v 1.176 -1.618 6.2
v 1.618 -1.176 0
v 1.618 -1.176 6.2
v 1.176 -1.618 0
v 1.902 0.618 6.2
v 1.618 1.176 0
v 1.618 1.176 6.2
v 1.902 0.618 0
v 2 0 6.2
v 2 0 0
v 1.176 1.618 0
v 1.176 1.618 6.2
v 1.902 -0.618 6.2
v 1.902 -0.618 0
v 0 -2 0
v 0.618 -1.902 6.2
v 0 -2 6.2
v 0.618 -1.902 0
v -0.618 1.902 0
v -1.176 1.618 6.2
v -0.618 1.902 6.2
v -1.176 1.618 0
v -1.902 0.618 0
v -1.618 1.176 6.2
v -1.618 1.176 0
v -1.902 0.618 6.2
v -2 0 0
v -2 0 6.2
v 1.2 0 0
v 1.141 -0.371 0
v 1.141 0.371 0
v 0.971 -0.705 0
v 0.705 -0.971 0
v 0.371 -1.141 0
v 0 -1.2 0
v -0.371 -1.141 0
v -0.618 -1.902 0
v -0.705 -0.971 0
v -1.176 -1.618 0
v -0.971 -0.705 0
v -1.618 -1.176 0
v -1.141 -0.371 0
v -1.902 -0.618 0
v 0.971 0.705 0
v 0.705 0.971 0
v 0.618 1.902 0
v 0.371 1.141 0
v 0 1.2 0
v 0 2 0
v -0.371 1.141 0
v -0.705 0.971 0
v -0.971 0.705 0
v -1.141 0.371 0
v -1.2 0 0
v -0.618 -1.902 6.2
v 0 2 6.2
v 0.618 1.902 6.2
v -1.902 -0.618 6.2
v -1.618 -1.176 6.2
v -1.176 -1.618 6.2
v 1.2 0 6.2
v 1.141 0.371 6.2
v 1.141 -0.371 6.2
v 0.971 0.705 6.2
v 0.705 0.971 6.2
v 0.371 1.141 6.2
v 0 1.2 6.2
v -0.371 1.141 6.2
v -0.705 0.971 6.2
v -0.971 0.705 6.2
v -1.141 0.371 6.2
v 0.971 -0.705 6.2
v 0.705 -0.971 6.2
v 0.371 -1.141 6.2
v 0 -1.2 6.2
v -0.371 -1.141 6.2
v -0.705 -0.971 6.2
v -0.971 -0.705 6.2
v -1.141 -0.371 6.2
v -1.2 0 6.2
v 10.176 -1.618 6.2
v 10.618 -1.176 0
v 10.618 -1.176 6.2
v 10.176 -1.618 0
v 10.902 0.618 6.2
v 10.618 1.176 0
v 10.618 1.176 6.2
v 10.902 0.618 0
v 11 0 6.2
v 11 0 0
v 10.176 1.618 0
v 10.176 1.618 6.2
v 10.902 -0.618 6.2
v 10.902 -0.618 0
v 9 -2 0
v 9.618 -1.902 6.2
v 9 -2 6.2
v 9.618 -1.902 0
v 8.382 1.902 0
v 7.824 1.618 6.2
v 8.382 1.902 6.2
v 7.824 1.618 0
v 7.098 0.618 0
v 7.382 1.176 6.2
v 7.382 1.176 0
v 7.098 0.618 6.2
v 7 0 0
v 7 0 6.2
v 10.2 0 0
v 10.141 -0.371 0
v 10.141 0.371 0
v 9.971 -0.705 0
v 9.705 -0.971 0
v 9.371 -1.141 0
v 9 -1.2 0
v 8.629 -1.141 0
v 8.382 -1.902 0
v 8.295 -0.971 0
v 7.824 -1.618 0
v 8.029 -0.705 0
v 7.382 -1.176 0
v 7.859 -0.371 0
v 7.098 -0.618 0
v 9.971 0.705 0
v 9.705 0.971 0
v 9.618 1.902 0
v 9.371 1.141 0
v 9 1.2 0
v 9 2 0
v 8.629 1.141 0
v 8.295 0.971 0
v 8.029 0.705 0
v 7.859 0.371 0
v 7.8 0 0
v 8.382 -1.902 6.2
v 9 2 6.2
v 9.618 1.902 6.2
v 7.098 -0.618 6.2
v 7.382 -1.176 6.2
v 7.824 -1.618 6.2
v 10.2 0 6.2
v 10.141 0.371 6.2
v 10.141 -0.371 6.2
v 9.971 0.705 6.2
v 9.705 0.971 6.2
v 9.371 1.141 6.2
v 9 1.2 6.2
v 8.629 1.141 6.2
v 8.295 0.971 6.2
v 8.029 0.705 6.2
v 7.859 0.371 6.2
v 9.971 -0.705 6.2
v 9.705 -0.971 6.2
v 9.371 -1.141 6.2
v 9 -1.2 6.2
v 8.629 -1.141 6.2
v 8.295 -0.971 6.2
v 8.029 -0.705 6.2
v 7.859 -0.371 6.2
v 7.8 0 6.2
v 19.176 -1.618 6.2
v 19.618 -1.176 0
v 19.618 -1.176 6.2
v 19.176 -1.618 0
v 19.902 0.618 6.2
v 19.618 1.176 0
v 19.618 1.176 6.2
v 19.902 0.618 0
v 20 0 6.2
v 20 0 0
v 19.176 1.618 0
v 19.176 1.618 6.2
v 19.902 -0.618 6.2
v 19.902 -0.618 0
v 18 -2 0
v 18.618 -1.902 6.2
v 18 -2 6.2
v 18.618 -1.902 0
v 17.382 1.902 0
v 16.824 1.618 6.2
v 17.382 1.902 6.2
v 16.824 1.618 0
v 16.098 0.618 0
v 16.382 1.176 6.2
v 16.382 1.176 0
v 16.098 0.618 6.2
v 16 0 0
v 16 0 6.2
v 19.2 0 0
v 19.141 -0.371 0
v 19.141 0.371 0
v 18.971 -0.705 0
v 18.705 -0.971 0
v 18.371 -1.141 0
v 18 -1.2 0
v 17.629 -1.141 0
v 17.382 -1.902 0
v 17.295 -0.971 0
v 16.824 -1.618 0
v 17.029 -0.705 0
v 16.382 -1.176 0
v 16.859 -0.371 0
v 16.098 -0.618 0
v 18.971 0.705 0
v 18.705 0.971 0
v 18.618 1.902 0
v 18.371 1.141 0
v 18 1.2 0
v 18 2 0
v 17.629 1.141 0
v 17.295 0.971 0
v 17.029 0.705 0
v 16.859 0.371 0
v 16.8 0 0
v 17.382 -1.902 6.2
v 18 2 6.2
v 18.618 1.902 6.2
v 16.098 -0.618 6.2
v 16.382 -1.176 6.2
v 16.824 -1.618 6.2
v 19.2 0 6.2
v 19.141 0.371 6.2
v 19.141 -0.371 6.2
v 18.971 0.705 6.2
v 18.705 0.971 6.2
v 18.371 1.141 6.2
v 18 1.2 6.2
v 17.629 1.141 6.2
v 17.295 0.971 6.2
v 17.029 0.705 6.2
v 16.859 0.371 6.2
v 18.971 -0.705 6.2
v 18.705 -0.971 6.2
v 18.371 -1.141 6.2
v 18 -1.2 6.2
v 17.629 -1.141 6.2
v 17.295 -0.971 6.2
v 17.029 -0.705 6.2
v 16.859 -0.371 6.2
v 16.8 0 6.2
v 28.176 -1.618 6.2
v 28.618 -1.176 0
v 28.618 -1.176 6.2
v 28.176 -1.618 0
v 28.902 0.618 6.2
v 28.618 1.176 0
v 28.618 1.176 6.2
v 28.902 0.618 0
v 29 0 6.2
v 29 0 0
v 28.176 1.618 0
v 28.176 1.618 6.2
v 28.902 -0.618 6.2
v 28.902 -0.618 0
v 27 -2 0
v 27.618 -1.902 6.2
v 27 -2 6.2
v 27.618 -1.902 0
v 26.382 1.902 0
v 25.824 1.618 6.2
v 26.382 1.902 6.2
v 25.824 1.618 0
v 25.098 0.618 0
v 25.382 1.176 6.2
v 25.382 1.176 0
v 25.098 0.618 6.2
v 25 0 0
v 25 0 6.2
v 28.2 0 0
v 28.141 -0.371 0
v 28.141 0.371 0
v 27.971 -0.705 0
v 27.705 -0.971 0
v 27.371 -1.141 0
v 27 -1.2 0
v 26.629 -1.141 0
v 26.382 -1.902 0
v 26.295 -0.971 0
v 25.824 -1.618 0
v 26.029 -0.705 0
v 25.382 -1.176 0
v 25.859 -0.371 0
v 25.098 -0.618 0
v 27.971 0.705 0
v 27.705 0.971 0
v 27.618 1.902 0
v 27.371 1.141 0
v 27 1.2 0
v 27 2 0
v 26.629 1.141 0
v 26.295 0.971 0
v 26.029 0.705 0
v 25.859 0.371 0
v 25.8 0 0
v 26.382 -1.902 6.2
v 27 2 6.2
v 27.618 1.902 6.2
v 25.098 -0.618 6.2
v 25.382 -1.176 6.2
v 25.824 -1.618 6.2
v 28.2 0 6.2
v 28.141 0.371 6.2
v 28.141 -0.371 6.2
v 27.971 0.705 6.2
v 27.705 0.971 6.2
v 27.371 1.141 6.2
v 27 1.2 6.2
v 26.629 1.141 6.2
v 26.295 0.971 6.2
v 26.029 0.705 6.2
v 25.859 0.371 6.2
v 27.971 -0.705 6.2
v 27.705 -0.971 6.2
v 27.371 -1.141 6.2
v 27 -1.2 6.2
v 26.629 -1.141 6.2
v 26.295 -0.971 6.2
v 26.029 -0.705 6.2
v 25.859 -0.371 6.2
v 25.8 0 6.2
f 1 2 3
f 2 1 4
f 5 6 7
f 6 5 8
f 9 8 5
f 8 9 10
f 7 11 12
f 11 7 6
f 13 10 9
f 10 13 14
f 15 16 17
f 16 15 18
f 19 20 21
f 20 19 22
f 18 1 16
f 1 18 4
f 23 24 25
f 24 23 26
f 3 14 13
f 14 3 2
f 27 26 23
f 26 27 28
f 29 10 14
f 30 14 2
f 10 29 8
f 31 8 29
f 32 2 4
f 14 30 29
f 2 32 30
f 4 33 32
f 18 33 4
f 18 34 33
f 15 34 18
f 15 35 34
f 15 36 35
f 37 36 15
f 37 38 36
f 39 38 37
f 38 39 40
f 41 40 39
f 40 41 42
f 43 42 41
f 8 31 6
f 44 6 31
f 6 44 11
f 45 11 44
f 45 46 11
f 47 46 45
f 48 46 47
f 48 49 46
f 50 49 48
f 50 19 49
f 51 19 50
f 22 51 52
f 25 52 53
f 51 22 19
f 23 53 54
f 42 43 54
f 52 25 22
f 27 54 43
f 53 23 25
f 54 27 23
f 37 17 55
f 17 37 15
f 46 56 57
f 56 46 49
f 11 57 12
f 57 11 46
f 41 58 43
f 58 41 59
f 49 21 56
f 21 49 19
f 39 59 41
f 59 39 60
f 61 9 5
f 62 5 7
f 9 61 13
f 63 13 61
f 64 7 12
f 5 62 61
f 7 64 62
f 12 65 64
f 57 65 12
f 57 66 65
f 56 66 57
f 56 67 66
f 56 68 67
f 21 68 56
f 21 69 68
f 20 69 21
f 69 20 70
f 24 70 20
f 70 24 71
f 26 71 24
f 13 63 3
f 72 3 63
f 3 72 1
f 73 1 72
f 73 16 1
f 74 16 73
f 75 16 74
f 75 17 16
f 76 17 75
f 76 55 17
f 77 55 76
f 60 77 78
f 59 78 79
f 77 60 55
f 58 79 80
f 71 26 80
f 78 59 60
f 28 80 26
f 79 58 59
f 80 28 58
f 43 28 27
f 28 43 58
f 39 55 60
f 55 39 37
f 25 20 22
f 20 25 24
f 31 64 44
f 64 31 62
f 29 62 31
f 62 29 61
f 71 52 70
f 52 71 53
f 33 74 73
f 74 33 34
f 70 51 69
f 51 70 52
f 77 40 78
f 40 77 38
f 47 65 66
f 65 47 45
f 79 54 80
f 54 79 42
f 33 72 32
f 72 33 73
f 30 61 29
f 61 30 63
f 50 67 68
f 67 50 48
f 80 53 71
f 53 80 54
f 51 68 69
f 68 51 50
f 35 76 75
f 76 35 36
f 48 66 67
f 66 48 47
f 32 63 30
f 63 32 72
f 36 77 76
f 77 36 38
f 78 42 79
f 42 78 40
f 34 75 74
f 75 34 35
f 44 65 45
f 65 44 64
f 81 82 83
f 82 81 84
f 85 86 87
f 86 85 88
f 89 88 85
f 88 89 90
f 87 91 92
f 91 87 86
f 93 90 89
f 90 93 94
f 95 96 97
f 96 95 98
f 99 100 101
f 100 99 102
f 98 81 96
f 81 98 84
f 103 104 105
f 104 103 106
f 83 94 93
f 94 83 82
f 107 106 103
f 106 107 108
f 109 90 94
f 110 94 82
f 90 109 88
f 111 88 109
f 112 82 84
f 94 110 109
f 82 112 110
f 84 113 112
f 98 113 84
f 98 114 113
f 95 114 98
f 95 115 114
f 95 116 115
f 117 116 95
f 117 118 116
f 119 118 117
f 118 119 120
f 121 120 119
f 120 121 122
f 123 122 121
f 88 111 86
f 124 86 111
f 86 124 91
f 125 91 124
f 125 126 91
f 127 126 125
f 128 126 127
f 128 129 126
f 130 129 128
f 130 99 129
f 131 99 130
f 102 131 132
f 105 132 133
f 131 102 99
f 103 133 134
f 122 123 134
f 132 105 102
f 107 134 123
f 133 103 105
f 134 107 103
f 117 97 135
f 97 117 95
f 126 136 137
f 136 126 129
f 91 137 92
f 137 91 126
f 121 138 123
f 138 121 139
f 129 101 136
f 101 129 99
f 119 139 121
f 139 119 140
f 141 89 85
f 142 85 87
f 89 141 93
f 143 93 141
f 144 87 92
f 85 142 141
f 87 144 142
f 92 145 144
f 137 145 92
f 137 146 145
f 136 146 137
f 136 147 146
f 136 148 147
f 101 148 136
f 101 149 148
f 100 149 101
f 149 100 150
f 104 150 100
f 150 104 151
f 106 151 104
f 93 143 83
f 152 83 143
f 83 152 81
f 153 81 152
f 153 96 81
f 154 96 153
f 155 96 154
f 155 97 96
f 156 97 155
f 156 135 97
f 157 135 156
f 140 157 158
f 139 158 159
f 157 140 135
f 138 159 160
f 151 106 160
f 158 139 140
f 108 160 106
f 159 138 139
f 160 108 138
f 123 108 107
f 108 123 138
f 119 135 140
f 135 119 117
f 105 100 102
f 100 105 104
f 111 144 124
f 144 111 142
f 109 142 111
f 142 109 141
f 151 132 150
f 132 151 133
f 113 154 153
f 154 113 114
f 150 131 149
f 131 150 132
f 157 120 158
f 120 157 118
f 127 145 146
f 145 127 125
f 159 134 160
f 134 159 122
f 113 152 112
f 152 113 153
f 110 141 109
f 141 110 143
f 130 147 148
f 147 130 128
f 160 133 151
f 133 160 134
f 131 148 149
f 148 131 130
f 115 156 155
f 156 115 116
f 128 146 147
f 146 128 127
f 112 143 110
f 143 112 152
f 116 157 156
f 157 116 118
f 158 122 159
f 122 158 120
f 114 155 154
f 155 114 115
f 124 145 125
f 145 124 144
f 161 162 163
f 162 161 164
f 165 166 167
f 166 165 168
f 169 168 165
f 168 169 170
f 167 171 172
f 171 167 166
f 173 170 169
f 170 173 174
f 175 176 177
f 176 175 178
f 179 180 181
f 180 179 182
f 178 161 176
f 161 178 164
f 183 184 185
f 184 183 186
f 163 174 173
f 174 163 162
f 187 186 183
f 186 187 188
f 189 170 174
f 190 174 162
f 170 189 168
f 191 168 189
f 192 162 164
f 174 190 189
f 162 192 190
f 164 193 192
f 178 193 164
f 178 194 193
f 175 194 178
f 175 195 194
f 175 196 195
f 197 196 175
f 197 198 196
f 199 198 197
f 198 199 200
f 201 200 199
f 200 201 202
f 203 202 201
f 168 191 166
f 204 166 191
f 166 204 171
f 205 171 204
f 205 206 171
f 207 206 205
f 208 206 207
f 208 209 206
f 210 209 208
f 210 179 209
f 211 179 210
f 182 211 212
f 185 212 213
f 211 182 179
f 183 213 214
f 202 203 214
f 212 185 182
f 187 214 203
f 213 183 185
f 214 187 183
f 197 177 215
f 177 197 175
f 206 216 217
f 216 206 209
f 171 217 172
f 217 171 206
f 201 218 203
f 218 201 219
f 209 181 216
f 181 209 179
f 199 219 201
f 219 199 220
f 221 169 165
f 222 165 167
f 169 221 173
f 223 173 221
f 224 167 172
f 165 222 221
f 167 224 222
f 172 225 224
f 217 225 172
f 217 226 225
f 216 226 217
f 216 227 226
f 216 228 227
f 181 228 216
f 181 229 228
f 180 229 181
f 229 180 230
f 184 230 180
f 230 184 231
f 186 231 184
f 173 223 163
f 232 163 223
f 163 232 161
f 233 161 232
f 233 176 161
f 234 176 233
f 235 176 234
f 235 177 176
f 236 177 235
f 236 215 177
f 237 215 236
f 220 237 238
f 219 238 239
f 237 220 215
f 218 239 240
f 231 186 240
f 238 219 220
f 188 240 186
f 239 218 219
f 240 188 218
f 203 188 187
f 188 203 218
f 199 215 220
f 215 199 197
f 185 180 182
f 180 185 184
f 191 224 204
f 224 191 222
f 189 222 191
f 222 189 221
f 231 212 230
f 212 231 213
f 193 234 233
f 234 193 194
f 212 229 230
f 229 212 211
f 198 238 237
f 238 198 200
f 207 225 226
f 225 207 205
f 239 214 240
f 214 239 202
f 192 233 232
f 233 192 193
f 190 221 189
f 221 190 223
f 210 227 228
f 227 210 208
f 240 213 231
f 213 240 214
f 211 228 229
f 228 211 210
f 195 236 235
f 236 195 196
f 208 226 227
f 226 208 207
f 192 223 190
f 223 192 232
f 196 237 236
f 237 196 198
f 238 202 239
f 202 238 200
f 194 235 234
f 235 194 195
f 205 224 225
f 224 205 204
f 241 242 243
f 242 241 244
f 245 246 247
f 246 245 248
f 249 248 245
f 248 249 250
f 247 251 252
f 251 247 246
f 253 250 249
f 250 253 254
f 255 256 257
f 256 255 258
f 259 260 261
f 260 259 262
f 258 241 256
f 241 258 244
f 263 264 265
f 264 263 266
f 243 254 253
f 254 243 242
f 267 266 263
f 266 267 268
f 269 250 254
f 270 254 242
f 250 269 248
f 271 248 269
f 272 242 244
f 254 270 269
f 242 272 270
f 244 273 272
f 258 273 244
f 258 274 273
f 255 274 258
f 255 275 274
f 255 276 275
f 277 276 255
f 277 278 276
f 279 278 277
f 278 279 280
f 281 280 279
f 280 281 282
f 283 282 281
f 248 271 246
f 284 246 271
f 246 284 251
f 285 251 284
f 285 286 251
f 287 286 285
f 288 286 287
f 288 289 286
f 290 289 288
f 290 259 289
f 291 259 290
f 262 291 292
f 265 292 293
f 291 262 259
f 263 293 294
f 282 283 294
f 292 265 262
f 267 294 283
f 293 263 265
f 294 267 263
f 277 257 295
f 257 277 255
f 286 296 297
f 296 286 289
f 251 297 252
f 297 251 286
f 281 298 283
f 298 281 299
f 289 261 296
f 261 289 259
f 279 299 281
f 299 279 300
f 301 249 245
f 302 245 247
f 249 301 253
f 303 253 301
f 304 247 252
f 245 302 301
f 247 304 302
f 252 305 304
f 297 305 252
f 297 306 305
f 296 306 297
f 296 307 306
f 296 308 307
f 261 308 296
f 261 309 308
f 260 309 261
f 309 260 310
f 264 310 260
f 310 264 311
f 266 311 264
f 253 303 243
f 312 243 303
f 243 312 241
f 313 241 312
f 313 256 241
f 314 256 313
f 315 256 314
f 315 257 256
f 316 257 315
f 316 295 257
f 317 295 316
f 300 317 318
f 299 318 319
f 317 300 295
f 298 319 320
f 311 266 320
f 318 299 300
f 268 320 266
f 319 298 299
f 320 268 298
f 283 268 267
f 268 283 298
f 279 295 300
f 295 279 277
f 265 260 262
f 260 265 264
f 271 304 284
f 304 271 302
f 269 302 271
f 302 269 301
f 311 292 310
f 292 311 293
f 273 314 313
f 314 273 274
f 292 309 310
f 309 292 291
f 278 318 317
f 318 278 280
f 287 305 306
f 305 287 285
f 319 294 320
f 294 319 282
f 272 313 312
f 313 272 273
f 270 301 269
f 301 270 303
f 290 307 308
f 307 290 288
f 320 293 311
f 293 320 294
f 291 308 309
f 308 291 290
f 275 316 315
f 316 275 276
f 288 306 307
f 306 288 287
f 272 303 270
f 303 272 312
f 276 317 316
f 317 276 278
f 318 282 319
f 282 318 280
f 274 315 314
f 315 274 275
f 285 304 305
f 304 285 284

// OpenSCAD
// ============================================================
// Board Standoffs - 4 separate cylinders with screw holes
// Glue into base at marker positions, or attach to lid
// ============================================================
include <common.scad>

module base_standoffs() {
    standoff_h = 6.2;
    standoff_r = board_hole_dia / 2 + 0.8;
    screw_hole_r = board_hole_dia / 2;
    e = 0.01;

    // Lay out 4 standoffs in a row for printing
    gap = 5;
    for (i = [0 : 3]) {
        translate([i * (standoff_r * 2 + gap), 0, 0])
            difference() {
                cylinder(r = standoff_r, h = standoff_h, $fn = 20);
                cylinder(r = screw_hole_r, h = standoff_h + e, $fn = 20);
            }
    }
}

base_standoffs();
